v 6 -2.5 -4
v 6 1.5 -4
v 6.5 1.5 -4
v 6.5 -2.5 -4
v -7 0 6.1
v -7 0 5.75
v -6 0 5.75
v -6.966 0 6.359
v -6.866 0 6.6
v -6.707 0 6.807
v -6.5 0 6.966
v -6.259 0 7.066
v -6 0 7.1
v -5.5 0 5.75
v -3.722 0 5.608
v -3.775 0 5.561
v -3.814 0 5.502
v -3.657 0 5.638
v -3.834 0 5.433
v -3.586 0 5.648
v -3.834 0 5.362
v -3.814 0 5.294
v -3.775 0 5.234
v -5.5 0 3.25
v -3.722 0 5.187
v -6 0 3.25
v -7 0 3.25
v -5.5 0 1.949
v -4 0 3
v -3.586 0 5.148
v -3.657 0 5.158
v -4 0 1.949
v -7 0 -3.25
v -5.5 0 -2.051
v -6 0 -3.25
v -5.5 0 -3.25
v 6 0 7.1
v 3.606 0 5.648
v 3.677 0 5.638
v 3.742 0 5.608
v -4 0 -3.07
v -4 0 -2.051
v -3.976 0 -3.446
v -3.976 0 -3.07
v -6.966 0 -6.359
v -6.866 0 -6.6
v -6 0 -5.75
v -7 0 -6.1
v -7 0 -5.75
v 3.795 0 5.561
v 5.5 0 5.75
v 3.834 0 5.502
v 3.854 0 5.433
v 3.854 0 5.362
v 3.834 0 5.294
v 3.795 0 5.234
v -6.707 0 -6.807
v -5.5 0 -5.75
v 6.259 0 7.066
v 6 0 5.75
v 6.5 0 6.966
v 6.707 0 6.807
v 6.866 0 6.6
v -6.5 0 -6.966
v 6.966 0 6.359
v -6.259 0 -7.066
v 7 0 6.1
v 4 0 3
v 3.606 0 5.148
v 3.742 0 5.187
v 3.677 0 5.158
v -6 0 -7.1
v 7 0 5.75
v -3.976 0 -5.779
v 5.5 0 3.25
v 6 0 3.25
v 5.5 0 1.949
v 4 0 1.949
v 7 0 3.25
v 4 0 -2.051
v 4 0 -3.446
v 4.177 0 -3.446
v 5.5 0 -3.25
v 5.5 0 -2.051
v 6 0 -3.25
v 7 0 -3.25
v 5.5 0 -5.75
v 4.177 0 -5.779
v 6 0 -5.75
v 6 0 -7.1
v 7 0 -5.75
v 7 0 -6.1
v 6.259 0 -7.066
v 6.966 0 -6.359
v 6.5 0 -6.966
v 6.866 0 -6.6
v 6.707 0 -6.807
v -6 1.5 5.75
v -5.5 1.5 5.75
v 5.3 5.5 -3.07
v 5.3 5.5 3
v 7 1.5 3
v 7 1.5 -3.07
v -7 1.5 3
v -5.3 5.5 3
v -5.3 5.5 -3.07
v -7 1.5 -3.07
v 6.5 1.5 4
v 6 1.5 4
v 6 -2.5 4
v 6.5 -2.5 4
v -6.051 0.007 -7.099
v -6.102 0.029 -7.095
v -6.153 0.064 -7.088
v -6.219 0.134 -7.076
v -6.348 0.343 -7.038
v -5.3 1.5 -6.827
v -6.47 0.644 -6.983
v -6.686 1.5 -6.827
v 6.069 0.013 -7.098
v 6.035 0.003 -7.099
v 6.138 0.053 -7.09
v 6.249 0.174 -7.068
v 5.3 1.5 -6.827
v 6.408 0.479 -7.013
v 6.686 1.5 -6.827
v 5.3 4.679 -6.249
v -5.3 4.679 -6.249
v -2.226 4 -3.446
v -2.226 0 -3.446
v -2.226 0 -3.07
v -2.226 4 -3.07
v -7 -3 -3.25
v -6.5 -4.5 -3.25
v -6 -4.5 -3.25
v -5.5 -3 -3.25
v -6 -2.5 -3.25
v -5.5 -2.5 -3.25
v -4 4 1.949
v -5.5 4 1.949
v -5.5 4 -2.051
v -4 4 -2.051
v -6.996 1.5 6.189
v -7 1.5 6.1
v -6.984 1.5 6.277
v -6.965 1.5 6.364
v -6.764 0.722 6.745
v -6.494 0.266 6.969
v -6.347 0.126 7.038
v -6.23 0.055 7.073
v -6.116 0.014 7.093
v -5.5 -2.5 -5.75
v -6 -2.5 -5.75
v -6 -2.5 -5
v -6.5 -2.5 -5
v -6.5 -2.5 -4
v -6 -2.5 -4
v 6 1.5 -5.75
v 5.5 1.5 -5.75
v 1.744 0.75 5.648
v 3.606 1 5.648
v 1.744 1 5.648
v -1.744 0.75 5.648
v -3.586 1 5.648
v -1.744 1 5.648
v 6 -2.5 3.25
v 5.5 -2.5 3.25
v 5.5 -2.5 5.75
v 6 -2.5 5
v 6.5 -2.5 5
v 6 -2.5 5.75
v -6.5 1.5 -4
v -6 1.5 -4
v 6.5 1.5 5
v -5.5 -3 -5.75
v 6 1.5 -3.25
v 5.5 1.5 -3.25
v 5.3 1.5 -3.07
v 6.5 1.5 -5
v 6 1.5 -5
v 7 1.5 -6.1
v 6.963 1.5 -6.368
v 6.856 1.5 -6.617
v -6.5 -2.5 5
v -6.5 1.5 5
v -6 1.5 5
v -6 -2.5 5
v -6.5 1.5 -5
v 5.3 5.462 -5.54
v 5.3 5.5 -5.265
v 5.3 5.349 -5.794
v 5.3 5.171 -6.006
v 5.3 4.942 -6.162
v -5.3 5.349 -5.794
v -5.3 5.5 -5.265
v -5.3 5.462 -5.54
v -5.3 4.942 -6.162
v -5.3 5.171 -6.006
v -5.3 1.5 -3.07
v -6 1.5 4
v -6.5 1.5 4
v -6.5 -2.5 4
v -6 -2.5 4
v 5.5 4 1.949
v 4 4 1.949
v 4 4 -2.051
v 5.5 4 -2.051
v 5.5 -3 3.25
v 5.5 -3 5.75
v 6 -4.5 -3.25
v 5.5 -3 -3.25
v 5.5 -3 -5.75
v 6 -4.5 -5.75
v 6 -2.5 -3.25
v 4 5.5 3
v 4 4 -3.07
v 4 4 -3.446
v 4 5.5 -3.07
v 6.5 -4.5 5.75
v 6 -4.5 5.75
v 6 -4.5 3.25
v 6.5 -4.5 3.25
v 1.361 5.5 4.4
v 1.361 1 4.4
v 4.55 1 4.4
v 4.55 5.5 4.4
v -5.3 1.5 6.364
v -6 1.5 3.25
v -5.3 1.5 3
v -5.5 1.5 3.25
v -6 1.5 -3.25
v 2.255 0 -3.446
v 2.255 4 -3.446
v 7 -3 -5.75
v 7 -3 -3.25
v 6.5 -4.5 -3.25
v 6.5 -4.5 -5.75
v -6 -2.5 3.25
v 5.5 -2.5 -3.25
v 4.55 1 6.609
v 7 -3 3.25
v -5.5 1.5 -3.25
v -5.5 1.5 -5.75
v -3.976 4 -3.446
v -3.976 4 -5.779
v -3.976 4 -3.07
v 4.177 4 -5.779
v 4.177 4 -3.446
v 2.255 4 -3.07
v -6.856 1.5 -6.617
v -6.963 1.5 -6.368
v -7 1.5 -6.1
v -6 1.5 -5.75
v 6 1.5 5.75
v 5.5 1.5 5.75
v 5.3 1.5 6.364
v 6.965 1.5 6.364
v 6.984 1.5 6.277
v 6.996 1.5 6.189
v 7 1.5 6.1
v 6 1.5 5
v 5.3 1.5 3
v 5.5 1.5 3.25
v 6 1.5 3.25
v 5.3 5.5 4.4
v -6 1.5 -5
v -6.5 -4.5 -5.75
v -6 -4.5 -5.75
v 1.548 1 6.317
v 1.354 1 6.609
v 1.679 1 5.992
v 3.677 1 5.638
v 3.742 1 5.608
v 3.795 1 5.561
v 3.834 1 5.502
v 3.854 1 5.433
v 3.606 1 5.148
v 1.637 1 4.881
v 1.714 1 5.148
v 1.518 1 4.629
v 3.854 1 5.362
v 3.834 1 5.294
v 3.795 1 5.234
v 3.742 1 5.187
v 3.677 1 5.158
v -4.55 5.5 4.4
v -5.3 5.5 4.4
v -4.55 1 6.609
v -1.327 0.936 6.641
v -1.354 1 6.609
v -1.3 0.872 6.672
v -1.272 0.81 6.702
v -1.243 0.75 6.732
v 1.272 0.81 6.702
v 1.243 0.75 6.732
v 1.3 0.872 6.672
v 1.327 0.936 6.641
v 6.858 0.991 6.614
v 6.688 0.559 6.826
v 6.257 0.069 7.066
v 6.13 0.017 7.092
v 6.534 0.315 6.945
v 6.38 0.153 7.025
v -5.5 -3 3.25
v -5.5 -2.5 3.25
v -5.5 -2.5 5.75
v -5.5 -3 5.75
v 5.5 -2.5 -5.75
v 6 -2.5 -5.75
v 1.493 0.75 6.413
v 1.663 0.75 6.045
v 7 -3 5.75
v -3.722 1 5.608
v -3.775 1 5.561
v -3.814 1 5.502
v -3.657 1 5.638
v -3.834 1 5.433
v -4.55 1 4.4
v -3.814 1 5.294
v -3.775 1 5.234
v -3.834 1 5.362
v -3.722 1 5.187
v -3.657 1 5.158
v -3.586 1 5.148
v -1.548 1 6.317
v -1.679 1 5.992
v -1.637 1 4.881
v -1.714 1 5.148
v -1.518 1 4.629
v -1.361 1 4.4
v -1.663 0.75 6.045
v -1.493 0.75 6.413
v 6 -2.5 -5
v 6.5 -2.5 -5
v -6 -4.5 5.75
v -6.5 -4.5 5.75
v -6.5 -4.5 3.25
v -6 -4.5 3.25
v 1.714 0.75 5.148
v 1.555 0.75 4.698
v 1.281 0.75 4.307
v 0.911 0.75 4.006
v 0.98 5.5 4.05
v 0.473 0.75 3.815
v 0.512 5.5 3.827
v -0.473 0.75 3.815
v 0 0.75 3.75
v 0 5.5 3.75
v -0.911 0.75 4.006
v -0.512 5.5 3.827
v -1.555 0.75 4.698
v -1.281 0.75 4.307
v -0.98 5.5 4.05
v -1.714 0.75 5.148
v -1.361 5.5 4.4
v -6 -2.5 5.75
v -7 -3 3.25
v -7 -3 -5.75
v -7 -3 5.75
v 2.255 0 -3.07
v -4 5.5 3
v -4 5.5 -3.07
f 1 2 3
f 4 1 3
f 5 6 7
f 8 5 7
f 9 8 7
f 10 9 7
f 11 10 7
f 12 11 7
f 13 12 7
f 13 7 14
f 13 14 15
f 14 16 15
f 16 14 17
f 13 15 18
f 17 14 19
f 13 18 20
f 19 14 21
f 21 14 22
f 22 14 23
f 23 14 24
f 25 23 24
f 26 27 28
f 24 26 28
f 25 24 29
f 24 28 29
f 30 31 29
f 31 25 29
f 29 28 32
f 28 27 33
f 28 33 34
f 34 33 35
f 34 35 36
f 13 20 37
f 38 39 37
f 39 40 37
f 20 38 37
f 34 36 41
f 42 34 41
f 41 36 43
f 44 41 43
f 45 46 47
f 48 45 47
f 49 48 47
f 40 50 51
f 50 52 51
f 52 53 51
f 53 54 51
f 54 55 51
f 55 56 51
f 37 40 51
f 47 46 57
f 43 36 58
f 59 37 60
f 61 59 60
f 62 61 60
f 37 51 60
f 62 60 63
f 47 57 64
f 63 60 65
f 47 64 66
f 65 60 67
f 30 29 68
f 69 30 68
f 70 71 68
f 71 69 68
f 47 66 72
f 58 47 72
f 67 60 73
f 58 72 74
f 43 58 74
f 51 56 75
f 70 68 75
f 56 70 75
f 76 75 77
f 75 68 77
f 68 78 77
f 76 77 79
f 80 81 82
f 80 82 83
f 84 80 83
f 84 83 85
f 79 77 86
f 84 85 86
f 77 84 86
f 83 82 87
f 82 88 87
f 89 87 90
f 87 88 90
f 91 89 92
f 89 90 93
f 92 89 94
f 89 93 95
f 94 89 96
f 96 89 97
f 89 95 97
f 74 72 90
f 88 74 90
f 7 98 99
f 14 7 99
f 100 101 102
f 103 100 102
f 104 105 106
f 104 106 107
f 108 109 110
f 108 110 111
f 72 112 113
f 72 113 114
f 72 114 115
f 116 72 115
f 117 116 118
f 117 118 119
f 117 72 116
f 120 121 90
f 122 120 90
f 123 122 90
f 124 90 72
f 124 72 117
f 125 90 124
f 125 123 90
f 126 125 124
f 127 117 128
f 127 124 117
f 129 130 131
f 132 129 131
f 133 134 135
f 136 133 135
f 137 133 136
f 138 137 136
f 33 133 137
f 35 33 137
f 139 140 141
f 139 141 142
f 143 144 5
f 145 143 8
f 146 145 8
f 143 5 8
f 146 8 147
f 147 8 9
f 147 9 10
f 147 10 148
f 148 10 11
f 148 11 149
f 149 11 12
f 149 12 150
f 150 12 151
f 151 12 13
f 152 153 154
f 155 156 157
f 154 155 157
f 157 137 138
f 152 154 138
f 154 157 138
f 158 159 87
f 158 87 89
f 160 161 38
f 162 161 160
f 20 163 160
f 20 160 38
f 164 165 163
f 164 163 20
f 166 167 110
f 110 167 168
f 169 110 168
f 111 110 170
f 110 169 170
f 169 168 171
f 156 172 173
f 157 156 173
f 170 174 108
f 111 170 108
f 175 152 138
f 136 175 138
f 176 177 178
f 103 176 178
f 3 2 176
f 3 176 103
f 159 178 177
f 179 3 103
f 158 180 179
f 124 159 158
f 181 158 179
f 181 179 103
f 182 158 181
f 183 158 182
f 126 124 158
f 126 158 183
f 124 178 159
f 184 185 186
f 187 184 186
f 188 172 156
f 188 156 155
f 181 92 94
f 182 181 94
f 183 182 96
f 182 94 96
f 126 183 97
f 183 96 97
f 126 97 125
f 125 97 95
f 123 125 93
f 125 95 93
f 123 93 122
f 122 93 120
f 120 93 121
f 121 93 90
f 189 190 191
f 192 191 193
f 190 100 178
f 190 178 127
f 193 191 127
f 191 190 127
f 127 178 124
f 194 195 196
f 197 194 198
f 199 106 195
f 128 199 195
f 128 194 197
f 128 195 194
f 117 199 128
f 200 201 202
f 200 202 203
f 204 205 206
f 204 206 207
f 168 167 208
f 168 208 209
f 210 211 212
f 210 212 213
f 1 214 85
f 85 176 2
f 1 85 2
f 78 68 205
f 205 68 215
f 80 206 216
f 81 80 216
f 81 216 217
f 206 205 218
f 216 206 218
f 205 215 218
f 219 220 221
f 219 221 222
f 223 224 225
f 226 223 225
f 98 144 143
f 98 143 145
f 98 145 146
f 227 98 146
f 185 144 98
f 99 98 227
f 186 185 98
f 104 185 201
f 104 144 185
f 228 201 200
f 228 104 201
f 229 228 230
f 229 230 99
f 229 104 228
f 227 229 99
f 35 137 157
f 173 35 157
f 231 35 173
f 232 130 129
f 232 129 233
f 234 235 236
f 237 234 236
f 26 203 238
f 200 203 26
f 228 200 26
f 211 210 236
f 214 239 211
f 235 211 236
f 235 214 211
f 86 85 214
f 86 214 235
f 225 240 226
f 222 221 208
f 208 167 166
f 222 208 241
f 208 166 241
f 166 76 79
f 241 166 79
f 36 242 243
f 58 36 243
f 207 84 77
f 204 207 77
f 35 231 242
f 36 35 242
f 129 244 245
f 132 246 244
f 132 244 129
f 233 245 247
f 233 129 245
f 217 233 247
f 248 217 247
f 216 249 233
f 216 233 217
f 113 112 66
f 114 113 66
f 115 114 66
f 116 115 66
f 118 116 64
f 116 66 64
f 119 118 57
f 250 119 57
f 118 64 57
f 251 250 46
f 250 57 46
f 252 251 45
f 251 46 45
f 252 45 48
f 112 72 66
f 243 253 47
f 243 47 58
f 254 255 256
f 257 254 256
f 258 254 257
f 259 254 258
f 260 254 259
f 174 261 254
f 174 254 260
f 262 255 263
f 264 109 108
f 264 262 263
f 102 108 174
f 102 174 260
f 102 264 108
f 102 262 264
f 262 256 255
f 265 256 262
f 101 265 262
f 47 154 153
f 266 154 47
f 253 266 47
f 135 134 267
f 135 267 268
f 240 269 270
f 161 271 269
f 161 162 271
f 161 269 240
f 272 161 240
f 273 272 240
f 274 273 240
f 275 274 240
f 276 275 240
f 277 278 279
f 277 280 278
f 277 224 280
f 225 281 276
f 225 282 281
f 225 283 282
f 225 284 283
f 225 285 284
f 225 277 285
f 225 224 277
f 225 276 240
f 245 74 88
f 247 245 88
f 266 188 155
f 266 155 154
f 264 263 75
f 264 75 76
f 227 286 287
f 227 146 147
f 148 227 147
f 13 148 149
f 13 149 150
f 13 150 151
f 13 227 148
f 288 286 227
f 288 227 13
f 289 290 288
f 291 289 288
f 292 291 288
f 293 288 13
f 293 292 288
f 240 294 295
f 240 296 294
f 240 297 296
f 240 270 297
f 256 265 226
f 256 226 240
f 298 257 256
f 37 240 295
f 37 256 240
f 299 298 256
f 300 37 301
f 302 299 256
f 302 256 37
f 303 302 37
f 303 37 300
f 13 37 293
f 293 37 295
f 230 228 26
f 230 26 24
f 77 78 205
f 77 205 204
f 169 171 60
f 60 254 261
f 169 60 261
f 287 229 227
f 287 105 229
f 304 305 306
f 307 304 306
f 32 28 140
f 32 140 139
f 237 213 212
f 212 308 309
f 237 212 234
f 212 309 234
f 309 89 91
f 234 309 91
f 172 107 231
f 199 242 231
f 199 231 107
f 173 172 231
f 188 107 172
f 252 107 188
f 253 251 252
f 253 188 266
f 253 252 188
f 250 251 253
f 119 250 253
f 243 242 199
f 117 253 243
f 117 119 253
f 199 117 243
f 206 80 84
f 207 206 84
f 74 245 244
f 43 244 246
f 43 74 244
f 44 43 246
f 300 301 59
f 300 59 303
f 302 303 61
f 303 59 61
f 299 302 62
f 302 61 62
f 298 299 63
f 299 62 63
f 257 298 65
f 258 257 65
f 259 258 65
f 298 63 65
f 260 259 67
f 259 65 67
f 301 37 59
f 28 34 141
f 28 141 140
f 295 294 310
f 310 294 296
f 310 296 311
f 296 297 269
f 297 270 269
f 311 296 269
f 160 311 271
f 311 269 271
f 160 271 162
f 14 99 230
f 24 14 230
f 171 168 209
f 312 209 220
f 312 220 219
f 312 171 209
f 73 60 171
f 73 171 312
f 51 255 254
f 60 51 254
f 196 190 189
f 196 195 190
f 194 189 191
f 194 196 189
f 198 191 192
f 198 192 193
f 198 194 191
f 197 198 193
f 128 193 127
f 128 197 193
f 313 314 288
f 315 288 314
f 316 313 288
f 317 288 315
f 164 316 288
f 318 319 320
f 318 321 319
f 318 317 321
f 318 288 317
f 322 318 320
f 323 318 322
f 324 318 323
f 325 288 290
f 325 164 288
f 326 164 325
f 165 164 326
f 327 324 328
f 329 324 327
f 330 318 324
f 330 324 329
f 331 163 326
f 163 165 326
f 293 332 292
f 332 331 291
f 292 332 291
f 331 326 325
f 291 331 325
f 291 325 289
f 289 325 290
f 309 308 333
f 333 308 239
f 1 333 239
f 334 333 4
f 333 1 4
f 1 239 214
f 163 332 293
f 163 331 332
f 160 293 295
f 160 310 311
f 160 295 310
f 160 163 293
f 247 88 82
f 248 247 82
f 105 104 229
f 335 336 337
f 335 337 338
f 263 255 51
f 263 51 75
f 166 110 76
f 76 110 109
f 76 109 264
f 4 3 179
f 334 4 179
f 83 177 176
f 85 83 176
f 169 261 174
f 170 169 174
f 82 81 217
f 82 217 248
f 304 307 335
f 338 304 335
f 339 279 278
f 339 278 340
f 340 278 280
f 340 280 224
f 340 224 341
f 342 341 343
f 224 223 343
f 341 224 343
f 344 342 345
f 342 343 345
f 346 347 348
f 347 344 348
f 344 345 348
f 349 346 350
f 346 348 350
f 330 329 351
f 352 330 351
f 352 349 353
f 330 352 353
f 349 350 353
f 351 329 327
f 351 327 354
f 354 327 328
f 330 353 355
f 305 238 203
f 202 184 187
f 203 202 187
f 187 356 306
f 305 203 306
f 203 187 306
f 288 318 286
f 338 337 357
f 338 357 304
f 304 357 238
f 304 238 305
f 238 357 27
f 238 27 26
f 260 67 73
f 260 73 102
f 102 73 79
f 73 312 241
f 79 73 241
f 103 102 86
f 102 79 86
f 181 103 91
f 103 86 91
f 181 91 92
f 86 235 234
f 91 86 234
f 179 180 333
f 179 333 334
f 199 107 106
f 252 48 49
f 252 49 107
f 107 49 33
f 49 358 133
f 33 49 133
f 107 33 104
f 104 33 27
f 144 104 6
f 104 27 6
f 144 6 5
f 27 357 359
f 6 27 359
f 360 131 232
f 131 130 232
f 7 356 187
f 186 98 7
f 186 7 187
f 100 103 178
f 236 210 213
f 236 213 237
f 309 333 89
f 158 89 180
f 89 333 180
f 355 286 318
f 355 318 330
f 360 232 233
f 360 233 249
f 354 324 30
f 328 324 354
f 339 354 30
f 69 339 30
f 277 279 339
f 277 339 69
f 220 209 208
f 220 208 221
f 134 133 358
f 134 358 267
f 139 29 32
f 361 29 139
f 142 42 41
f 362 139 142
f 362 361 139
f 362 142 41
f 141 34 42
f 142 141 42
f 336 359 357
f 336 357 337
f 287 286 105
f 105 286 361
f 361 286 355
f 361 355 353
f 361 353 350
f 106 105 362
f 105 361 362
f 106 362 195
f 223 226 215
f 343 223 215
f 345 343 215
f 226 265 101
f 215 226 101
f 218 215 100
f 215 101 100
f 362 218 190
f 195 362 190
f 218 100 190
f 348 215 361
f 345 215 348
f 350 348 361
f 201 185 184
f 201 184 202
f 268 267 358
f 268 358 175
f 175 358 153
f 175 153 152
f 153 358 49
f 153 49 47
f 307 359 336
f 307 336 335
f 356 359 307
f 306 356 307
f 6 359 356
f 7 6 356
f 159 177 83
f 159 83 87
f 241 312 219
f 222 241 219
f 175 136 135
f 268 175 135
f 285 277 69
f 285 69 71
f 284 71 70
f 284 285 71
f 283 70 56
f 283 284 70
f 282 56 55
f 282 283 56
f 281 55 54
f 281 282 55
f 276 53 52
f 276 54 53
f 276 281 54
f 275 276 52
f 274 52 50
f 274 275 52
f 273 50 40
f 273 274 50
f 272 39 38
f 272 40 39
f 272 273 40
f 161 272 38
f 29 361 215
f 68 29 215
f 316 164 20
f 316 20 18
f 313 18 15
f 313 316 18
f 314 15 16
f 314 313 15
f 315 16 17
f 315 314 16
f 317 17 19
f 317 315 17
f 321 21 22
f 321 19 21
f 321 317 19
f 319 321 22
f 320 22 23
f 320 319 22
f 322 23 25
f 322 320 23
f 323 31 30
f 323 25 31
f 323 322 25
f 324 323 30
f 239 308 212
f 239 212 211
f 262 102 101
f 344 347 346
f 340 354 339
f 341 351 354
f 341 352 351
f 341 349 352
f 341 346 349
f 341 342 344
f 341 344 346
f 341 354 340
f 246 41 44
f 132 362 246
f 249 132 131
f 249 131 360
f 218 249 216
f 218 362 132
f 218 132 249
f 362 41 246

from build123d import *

# Parameters (mm, degrees)
BOSS_EXTRUDE1_DEPTH = 1.5
SKETCH2_W           = 10.6
SKETCH2_H           = 11.5
BOSS_EXTRUDE2_DEPTH = 4
BOSS_EXTRUDE4_DEPTH = 6.07
SKETCH5_W           = 1.5
SKETCH5_H           = 2.5
BOSS_EXTRUDE5_DEPTH = 4.5
SKETCH6_W           = 0.5
SKETCH6_H           = 2.5
CUT_EXTRUDE1_DEPTH  = 16.632418239
CUT_EXTRUDE3_DEPTH  = 4
SKETCH8_W           = 8
SKETCH8_H           = 6.07
CUT_EXTRUDE4_DEPTH  = 15.121260567
SKETCH10_R          = 1.75
CUT_EXTRUDE5_DEPTH  = 4.75
SKETCH12_W          = 2.7
SKETCH12_H          = 4
BOSS_EXTRUDE6_DEPTH = 0.75
SKETCH13_W          = 2.7
SKETCH13_H          = 4
BOSS_EXTRUDE7_DEPTH = 0.75
CUT_EXTRUDE6_DEPTH  = 17.633099531
CUT_EXTRUDE7_DEPTH  = 12.636580254
SKETCH17_W          = 9.1
SKETCH17_H          = 2.975518652
CUT_EXTRUDE8_DEPTH  = 0.5
FILLET2_R           = 1
SKETCH18_W          = 8.152515879
SKETCH18_H          = 2.332912786
CUT_EXTRUDE9_DEPTH  = 4
SKETCH19_W          = 1.745
SKETCH19_H          = 0.376419973
SKETCH19_W_2        = 1.75
CUT_EXTRUDE10_DEPTH = 4
SKETCH20_W          = 1.5
SKETCH20_H          = 4
CUT_EXTRUDE11_DEPTH = 4


with BuildPart() as part:
    # Sketch1 → Boss-Extrude1 (new body)
    with BuildSketch(Plane(origin=(0, 0, 0), x_dir=(1, 0, 0), z_dir=(0, 1, 0))):
        with BuildLine():
            Line((-6, -7.1), (6, -7.1))
            ThreePointArc((6, -7.1), (6.707106781, -6.807106781), (7, -6.1))
            Line((7, -6.1), (7, 6.1))
            ThreePointArc((7, 6.1), (6.707106781, 6.807106781), (6, 7.1))
            Line((6, 7.1), (-6, 7.1))
            ThreePointArc((-6, 7.1), (-6.707106781, 6.807106781), (-7, 6.1))
            Line((-7, 6.1), (-7, -6.1))
            ThreePointArc((-7, -6.1), (-6.707106781, -6.807106781), (-6, -7.1))
        make_face()
    extrude(amount=BOSS_EXTRUDE1_DEPTH)

    # Sketch2 → Boss-Extrude2 (add)
    with BuildSketch(Plane(origin=(0, 1.5, 0), x_dir=(1, 0, 0), z_dir=(0, 1, 0))):
        with Locations((0, 1.35)):
            Rectangle(SKETCH2_W, SKETCH2_H)
    extrude(amount=BOSS_EXTRUDE2_DEPTH)

    # Sketch4 → Boss-Extrude4 (add)
    with BuildSketch(Plane.XY.offset(3)):
        Polygon((-5.3, 5.5), (-7, 1.5), (-5.3, 1.5), align=None)
        Polygon((5.3, 5.5), (7, 1.5), (5.3, 1.5), align=None)
    extrude(amount=-BOSS_EXTRUDE4_DEPTH)

    # Sketch5 → Boss-Extrude5 (add)
    with BuildSketch(Plane.XZ):
        with Locations((-6.25, -4.5)):
            Rectangle(SKETCH5_W, SKETCH5_H)
        with Locations((-6.25, 4.5)):
            Rectangle(SKETCH5_W, SKETCH5_H)
        with Locations((6.25, 4.5)):
            Rectangle(SKETCH5_W, SKETCH5_H)
        with Locations((6.25, -4.5)):
            Rectangle(SKETCH5_W, SKETCH5_H)
    extrude(amount=BOSS_EXTRUDE5_DEPTH)

    # Sketch6 → Cut-Extrude1 (cut, through all)
    with BuildSketch(Plane.XY.offset(5.75)):
        with Locations((-5.75, -1.25)):
            Rectangle(SKETCH6_W, SKETCH6_H)
        Polygon((-5.5, -4.5), (-5.5, -3), (-6, -4.5), align=None)
        Polygon((-7, -3), (-7, -4.5), (-6.5, -4.5), align=None)
        Polygon((6.5, -4.5), (7, -4.5), (7, -3), align=None)
        Polygon((5.5, -3), (5.5, -4.5), (6, -4.5), align=None)
        with Locations((5.75, -1.25)):
            Rectangle(SKETCH6_W, SKETCH6_H)
    extrude(amount=-CUT_EXTRUDE1_DEPTH, mode=Mode.SUBTRACT)

    # Sketch7 → Cut-Extrude3 (cut)
    with BuildSketch(Plane(origin=(0, 1.5, 0), x_dir=(1, 0, 0), z_dir=(0, 1, 0))):
        Polygon((-5.5, -3.25), (-6, -3.25), (-6, -4), (-6.5, -4), (-6.5, -5), (-6, -5), (-6, -5.75), (-5.5, -5.75), align=None)
        Polygon((-6, 4), (-6, 3.25), (-5.5, 3.25), (-5.5, 5.75), (-6, 5.75), (-6, 5), (-6.5, 5), (-6.5, 4), align=None)
        Polygon((5.5, 3.25), (6, 3.25), (6, 4), (6.5, 4), (6.5, 5), (6, 5), (6, 5.75), (5.5, 5.75), align=None)
        Polygon((6, -4), (6, -3.25), (5.5, -3.25), (5.5, -5.75), (6, -5.75), (6, -5), (6.5, -5), (6.5, -4), align=None)
    extrude(amount=-CUT_EXTRUDE3_DEPTH, mode=Mode.SUBTRACT)

    # Sketch8 → Cut-Extrude4 (cut, through all)
    with BuildSketch(Plane(origin=(0, 5.5, 0), x_dir=(1, 0, 0), z_dir=(0, 1, 0))):
        with Locations((0, 0.035)):
            Rectangle(SKETCH8_W, SKETCH8_H)
    extrude(amount=-CUT_EXTRUDE4_DEPTH, mode=Mode.SUBTRACT)

    # Sketch10 → Cut-Extrude5 (cut)
    with BuildSketch(Plane(origin=(0, 5.5, 0), x_dir=(1, 0, 0), z_dir=(0, 1, 0))):
        with Locations((0, -5.5)):
            Circle(SKETCH10_R)
    extrude(amount=-CUT_EXTRUDE5_DEPTH, mode=Mode.SUBTRACT)

    # Sketch12 → Boss-Extrude6 (add)
    with BuildSketch(Plane.ZY.offset(5.3)):
        with Locations((5.75, 3.5)):
            Rectangle(SKETCH12_W, SKETCH12_H)
    extrude(amount=-BOSS_EXTRUDE6_DEPTH)

    # Sketch13 → Boss-Extrude7 (add)
    with BuildSketch(Plane(origin=(5.3, 0, 0), x_dir=(0, 0, -1), z_dir=(1, 0, 0))):
        with Locations((-5.75, 3.5)):
            Rectangle(SKETCH13_W, SKETCH13_H)
    extrude(amount=-BOSS_EXTRUDE7_DEPTH)

    # Sketch15 → Cut-Extrude6 (cut, through all)
    with BuildSketch(Plane(origin=(7, 0, 0), x_dir=(0, 0, -1), z_dir=(1, 0, 0))):
        Polygon((-4.4, 5.5), (-7.1, 0), (-7.1, 5.5), align=None)
        Polygon((7.1, 0), (6.1, 5.5), (7.1, 5.5), align=None)
    extrude(amount=-CUT_EXTRUDE6_DEPTH, mode=Mode.SUBTRACT)

    # Sketch16 → Cut-Extrude7 (cut, through all)
    with BuildSketch(Plane(origin=(0, 1.5, 0), x_dir=(1, 0, 0), z_dir=(0, 1, 0))):
        with BuildLine():
            Line((-3.586359169, -5.147740482), (3.606419083, -5.147740482))
            ThreePointArc((3.606419083, -5.147740482), (3.856419083, -5.397740482), (3.606419083, -5.647740482))
            Line((3.606419083, -5.647740482), (-3.586359169, -5.647740482))
            ThreePointArc((-3.586359169, -5.647740482), (-3.836359169, -5.397740482), (-3.586359169, -5.147740482))
        make_face()
    extrude(amount=-CUT_EXTRUDE7_DEPTH, mode=Mode.SUBTRACT)

    # Sketch17 → Cut-Extrude8 (cut)
    with BuildSketch(Plane(origin=(0, 1.5, 0), x_dir=(1, 0, 0), z_dir=(0, 1, 0))):
        with Locations((0, -5.887759326)):
            Rectangle(SKETCH17_W, SKETCH17_H)
    extrude(amount=-CUT_EXTRUDE8_DEPTH, mode=Mode.SUBTRACT)

    # Fillet2
    fillet2_edges = [part.edges().sort_by_distance(p)[0] for p in [
        (0, 5.5, -6.1),
    ]]
    fillet(fillet2_edges, radius=FILLET2_R)

    # Sketch18 → Cut-Extrude9 (cut)
    with BuildSketch(Plane.XZ):
        with Locations((0.100583502, -4.612876366)):
            Rectangle(SKETCH18_W, SKETCH18_H)
    extrude(amount=-CUT_EXTRUDE9_DEPTH, mode=Mode.SUBTRACT)

    # Sketch19 → Cut-Extrude10 (cut)
    with BuildSketch(Plane.XZ):
        with Locations((3.1275, -3.258209987)):
            Rectangle(SKETCH19_W, SKETCH19_H)
        with Locations((-3.100674438, -3.258209987)):
            Rectangle(SKETCH19_W_2, SKETCH19_H)
    extrude(amount=-CUT_EXTRUDE10_DEPTH, mode=Mode.SUBTRACT)

    # Sketch20 → Cut-Extrude11 (cut)
    with BuildSketch(Plane.XZ):
        with Locations((4.75, -0.051196063)):
            Rectangle(SKETCH20_W, SKETCH20_H)
        with Locations((-4.75, -0.051196063)):
            Rectangle(SKETCH20_W, SKETCH20_H)
    extrude(amount=-CUT_EXTRUDE11_DEPTH, mode=Mode.SUBTRACT)


solid = part.part
